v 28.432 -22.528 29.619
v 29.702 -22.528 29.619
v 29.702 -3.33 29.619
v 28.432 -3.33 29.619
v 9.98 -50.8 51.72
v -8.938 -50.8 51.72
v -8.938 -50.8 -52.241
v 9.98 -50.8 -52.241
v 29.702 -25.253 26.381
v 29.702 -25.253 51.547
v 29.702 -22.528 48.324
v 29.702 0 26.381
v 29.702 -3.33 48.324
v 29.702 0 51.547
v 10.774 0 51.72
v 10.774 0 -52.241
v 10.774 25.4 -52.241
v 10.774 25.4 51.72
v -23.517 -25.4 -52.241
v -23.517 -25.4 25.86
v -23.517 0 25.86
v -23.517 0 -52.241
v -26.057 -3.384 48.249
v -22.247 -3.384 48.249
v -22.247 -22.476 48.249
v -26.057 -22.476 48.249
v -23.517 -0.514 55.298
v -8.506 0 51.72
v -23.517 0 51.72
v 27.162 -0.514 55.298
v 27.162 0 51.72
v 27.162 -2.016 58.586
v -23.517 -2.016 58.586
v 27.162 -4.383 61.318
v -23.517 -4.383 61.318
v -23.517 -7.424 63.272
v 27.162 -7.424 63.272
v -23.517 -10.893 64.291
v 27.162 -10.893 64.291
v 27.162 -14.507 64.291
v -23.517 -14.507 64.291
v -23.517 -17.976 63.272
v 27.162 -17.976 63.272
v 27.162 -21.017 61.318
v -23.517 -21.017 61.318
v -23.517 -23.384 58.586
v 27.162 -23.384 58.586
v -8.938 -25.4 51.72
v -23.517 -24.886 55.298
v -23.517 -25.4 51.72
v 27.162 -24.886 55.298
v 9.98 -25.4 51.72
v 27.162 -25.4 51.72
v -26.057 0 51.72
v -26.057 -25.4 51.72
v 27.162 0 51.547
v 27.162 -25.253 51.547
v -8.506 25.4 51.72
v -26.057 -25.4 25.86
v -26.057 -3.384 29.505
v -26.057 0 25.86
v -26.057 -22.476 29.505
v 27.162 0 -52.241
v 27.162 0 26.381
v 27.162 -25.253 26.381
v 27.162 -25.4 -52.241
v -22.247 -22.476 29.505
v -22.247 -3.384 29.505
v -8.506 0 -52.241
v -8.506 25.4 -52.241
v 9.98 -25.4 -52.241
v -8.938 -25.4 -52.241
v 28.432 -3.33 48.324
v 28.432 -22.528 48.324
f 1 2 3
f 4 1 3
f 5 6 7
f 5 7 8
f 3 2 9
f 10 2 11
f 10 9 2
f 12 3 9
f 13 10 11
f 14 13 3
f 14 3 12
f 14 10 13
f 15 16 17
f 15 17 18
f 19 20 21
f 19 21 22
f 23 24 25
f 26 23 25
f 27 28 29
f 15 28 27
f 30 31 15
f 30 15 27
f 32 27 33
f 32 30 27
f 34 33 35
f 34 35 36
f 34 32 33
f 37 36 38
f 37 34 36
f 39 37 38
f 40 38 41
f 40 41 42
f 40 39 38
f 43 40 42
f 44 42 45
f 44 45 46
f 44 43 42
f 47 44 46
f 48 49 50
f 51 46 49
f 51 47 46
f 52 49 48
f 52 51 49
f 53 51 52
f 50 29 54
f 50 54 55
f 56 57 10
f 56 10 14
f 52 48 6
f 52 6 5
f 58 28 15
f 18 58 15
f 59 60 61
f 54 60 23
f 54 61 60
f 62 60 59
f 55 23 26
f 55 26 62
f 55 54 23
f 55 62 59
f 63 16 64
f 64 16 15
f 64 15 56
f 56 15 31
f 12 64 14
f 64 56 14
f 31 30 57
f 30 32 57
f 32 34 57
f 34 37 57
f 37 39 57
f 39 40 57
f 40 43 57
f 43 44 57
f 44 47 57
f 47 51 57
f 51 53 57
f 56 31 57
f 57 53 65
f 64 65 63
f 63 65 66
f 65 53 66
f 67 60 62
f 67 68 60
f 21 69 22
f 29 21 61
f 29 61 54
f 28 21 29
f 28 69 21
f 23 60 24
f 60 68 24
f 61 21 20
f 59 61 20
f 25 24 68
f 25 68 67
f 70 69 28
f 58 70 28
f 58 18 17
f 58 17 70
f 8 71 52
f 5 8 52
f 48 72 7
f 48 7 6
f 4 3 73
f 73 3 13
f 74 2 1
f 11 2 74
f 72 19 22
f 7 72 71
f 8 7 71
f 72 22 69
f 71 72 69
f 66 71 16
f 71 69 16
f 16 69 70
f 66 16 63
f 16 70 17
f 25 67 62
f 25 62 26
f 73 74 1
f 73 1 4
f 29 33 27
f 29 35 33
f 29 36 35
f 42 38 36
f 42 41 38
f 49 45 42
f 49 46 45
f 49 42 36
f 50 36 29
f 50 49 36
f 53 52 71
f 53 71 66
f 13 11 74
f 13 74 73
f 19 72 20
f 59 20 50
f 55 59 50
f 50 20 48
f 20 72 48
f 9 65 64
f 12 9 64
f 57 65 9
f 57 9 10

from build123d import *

# Parameters (mm, degrees)
F0_W      = 50.6787924096
F0_H      = 103.9609350264
F1_DEPTH  = 25.4
F4_W      = 18.917764537
F4_H      = 103.9609350264
F5_DEPTH  = 25.4
F6_W      = 19.2797044292
F6_H      = 103.9609350264
F7_DEPTH  = 25.4
F10_W     = 25.2526141703
F10_H     = 25.1658372581
F11_DEPTH = 2.54
F28_W     = 19.1976749338
F28_H     = 18.704187125
F29_DEPTH = 1.27
F30_W     = 19.0913220868
F30_H     = 18.744206056
F31_DEPTH = 1.27
F32_W     = 25.4
F32_H     = 25.8600655943
F32_W_2   = 19.0913220868
F32_H_2   = 18.744206056
F33_DEPTH = 2.54


# Not quite as in the source:
# - the program builds the solid bodies; features that only make, move or delete a surface that nothing else refers to are left out


with BuildPart() as f1:
    # F0 (on Front) → F1 (new body)
    with BuildSketch(Plane.XZ):
        with Locations((1.8223566003, -0.2603363246)):
            Rectangle(F0_W, F0_H)
    extrude(amount=F1_DEPTH)

    # F4 (on face) → F5 (join)
    with BuildSketch(Plane.XZ.offset(25.4)):
        with Locations((0.5206721835, -0.2603363246)):
            Rectangle(F4_W, F4_H)
    extrude(amount=F5_DEPTH)

    # F6 (on face) → F7 (join)
    with BuildSketch(Plane(origin=(0, 0, 0), x_dir=(-1, 0, 0), z_dir=(0, 1, 0))):
        with Locations((-1.1341772042, -0.2603363246)):
            Rectangle(F6_W, F6_H)
    extrude(amount=F7_DEPTH)

    # F9: sweep along a path in F8
    with BuildLine(Plane.XY.offset(51.7201311886)) as f9_path:
        Line((-23.5170396045, -12.7), (27.1617528051, -12.7))
    # F3 (on face) → F9 (sweep)
    with BuildSketch(Plane(origin=(-23.5170396045, 0, 0), x_dir=(0, -1, 0), z_dir=(-1, 0, 0))):
        with BuildLine():
            Line((0, 51.7201311886), (25.4, 51.7201311886))
            ThreePointArc((25.4, 51.7201311886), (12.7, 64.4201311886), (0, 51.7201311886))
        make_face()
    sweep(path=f9_path.line)

    # F10 (on face) → F11 (join)
    with BuildSketch(Plane.YZ.offset(27.1617528051)):
        with Locations((-12.6263070852, 38.9636550099)):
            Rectangle(F10_W, F10_H)
    extrude(amount=F11_DEPTH)

    # F28 (on face) → F29 (cut)
    with BuildSketch(Plane.YZ.offset(29.7017528051)):
        with Locations((-12.9288590979, 38.9715339988)):
            Rectangle(F28_W, F28_H)
    extrude(amount=-F29_DEPTH, mode=Mode.SUBTRACT)

    # F30 (on face) → F31 (cut)
    with BuildSketch(Plane(origin=(-23.5170396045, 0, 0), x_dir=(0, -1, 0), z_dir=(-1, 0, 0))):
        with Locations((12.9300323315, 38.8768771663)):
            Rectangle(F30_W, F30_H)
    extrude(amount=-F31_DEPTH, mode=Mode.SUBTRACT)

    # F32 (on face) → F33 (join)
    with BuildSketch(Plane(origin=(-23.5170396045, 0, 0), x_dir=(0, -1, 0), z_dir=(-1, 0, 0))):
        with Locations((12.7, 38.7900983915)):
            Rectangle(F32_W, F32_H)
        with Locations((12.9300323315, 38.8768771663)):
            Rectangle(F32_W_2, F32_H_2, mode=Mode.SUBTRACT)
    extrude(amount=F33_DEPTH)


solid = f1.part
